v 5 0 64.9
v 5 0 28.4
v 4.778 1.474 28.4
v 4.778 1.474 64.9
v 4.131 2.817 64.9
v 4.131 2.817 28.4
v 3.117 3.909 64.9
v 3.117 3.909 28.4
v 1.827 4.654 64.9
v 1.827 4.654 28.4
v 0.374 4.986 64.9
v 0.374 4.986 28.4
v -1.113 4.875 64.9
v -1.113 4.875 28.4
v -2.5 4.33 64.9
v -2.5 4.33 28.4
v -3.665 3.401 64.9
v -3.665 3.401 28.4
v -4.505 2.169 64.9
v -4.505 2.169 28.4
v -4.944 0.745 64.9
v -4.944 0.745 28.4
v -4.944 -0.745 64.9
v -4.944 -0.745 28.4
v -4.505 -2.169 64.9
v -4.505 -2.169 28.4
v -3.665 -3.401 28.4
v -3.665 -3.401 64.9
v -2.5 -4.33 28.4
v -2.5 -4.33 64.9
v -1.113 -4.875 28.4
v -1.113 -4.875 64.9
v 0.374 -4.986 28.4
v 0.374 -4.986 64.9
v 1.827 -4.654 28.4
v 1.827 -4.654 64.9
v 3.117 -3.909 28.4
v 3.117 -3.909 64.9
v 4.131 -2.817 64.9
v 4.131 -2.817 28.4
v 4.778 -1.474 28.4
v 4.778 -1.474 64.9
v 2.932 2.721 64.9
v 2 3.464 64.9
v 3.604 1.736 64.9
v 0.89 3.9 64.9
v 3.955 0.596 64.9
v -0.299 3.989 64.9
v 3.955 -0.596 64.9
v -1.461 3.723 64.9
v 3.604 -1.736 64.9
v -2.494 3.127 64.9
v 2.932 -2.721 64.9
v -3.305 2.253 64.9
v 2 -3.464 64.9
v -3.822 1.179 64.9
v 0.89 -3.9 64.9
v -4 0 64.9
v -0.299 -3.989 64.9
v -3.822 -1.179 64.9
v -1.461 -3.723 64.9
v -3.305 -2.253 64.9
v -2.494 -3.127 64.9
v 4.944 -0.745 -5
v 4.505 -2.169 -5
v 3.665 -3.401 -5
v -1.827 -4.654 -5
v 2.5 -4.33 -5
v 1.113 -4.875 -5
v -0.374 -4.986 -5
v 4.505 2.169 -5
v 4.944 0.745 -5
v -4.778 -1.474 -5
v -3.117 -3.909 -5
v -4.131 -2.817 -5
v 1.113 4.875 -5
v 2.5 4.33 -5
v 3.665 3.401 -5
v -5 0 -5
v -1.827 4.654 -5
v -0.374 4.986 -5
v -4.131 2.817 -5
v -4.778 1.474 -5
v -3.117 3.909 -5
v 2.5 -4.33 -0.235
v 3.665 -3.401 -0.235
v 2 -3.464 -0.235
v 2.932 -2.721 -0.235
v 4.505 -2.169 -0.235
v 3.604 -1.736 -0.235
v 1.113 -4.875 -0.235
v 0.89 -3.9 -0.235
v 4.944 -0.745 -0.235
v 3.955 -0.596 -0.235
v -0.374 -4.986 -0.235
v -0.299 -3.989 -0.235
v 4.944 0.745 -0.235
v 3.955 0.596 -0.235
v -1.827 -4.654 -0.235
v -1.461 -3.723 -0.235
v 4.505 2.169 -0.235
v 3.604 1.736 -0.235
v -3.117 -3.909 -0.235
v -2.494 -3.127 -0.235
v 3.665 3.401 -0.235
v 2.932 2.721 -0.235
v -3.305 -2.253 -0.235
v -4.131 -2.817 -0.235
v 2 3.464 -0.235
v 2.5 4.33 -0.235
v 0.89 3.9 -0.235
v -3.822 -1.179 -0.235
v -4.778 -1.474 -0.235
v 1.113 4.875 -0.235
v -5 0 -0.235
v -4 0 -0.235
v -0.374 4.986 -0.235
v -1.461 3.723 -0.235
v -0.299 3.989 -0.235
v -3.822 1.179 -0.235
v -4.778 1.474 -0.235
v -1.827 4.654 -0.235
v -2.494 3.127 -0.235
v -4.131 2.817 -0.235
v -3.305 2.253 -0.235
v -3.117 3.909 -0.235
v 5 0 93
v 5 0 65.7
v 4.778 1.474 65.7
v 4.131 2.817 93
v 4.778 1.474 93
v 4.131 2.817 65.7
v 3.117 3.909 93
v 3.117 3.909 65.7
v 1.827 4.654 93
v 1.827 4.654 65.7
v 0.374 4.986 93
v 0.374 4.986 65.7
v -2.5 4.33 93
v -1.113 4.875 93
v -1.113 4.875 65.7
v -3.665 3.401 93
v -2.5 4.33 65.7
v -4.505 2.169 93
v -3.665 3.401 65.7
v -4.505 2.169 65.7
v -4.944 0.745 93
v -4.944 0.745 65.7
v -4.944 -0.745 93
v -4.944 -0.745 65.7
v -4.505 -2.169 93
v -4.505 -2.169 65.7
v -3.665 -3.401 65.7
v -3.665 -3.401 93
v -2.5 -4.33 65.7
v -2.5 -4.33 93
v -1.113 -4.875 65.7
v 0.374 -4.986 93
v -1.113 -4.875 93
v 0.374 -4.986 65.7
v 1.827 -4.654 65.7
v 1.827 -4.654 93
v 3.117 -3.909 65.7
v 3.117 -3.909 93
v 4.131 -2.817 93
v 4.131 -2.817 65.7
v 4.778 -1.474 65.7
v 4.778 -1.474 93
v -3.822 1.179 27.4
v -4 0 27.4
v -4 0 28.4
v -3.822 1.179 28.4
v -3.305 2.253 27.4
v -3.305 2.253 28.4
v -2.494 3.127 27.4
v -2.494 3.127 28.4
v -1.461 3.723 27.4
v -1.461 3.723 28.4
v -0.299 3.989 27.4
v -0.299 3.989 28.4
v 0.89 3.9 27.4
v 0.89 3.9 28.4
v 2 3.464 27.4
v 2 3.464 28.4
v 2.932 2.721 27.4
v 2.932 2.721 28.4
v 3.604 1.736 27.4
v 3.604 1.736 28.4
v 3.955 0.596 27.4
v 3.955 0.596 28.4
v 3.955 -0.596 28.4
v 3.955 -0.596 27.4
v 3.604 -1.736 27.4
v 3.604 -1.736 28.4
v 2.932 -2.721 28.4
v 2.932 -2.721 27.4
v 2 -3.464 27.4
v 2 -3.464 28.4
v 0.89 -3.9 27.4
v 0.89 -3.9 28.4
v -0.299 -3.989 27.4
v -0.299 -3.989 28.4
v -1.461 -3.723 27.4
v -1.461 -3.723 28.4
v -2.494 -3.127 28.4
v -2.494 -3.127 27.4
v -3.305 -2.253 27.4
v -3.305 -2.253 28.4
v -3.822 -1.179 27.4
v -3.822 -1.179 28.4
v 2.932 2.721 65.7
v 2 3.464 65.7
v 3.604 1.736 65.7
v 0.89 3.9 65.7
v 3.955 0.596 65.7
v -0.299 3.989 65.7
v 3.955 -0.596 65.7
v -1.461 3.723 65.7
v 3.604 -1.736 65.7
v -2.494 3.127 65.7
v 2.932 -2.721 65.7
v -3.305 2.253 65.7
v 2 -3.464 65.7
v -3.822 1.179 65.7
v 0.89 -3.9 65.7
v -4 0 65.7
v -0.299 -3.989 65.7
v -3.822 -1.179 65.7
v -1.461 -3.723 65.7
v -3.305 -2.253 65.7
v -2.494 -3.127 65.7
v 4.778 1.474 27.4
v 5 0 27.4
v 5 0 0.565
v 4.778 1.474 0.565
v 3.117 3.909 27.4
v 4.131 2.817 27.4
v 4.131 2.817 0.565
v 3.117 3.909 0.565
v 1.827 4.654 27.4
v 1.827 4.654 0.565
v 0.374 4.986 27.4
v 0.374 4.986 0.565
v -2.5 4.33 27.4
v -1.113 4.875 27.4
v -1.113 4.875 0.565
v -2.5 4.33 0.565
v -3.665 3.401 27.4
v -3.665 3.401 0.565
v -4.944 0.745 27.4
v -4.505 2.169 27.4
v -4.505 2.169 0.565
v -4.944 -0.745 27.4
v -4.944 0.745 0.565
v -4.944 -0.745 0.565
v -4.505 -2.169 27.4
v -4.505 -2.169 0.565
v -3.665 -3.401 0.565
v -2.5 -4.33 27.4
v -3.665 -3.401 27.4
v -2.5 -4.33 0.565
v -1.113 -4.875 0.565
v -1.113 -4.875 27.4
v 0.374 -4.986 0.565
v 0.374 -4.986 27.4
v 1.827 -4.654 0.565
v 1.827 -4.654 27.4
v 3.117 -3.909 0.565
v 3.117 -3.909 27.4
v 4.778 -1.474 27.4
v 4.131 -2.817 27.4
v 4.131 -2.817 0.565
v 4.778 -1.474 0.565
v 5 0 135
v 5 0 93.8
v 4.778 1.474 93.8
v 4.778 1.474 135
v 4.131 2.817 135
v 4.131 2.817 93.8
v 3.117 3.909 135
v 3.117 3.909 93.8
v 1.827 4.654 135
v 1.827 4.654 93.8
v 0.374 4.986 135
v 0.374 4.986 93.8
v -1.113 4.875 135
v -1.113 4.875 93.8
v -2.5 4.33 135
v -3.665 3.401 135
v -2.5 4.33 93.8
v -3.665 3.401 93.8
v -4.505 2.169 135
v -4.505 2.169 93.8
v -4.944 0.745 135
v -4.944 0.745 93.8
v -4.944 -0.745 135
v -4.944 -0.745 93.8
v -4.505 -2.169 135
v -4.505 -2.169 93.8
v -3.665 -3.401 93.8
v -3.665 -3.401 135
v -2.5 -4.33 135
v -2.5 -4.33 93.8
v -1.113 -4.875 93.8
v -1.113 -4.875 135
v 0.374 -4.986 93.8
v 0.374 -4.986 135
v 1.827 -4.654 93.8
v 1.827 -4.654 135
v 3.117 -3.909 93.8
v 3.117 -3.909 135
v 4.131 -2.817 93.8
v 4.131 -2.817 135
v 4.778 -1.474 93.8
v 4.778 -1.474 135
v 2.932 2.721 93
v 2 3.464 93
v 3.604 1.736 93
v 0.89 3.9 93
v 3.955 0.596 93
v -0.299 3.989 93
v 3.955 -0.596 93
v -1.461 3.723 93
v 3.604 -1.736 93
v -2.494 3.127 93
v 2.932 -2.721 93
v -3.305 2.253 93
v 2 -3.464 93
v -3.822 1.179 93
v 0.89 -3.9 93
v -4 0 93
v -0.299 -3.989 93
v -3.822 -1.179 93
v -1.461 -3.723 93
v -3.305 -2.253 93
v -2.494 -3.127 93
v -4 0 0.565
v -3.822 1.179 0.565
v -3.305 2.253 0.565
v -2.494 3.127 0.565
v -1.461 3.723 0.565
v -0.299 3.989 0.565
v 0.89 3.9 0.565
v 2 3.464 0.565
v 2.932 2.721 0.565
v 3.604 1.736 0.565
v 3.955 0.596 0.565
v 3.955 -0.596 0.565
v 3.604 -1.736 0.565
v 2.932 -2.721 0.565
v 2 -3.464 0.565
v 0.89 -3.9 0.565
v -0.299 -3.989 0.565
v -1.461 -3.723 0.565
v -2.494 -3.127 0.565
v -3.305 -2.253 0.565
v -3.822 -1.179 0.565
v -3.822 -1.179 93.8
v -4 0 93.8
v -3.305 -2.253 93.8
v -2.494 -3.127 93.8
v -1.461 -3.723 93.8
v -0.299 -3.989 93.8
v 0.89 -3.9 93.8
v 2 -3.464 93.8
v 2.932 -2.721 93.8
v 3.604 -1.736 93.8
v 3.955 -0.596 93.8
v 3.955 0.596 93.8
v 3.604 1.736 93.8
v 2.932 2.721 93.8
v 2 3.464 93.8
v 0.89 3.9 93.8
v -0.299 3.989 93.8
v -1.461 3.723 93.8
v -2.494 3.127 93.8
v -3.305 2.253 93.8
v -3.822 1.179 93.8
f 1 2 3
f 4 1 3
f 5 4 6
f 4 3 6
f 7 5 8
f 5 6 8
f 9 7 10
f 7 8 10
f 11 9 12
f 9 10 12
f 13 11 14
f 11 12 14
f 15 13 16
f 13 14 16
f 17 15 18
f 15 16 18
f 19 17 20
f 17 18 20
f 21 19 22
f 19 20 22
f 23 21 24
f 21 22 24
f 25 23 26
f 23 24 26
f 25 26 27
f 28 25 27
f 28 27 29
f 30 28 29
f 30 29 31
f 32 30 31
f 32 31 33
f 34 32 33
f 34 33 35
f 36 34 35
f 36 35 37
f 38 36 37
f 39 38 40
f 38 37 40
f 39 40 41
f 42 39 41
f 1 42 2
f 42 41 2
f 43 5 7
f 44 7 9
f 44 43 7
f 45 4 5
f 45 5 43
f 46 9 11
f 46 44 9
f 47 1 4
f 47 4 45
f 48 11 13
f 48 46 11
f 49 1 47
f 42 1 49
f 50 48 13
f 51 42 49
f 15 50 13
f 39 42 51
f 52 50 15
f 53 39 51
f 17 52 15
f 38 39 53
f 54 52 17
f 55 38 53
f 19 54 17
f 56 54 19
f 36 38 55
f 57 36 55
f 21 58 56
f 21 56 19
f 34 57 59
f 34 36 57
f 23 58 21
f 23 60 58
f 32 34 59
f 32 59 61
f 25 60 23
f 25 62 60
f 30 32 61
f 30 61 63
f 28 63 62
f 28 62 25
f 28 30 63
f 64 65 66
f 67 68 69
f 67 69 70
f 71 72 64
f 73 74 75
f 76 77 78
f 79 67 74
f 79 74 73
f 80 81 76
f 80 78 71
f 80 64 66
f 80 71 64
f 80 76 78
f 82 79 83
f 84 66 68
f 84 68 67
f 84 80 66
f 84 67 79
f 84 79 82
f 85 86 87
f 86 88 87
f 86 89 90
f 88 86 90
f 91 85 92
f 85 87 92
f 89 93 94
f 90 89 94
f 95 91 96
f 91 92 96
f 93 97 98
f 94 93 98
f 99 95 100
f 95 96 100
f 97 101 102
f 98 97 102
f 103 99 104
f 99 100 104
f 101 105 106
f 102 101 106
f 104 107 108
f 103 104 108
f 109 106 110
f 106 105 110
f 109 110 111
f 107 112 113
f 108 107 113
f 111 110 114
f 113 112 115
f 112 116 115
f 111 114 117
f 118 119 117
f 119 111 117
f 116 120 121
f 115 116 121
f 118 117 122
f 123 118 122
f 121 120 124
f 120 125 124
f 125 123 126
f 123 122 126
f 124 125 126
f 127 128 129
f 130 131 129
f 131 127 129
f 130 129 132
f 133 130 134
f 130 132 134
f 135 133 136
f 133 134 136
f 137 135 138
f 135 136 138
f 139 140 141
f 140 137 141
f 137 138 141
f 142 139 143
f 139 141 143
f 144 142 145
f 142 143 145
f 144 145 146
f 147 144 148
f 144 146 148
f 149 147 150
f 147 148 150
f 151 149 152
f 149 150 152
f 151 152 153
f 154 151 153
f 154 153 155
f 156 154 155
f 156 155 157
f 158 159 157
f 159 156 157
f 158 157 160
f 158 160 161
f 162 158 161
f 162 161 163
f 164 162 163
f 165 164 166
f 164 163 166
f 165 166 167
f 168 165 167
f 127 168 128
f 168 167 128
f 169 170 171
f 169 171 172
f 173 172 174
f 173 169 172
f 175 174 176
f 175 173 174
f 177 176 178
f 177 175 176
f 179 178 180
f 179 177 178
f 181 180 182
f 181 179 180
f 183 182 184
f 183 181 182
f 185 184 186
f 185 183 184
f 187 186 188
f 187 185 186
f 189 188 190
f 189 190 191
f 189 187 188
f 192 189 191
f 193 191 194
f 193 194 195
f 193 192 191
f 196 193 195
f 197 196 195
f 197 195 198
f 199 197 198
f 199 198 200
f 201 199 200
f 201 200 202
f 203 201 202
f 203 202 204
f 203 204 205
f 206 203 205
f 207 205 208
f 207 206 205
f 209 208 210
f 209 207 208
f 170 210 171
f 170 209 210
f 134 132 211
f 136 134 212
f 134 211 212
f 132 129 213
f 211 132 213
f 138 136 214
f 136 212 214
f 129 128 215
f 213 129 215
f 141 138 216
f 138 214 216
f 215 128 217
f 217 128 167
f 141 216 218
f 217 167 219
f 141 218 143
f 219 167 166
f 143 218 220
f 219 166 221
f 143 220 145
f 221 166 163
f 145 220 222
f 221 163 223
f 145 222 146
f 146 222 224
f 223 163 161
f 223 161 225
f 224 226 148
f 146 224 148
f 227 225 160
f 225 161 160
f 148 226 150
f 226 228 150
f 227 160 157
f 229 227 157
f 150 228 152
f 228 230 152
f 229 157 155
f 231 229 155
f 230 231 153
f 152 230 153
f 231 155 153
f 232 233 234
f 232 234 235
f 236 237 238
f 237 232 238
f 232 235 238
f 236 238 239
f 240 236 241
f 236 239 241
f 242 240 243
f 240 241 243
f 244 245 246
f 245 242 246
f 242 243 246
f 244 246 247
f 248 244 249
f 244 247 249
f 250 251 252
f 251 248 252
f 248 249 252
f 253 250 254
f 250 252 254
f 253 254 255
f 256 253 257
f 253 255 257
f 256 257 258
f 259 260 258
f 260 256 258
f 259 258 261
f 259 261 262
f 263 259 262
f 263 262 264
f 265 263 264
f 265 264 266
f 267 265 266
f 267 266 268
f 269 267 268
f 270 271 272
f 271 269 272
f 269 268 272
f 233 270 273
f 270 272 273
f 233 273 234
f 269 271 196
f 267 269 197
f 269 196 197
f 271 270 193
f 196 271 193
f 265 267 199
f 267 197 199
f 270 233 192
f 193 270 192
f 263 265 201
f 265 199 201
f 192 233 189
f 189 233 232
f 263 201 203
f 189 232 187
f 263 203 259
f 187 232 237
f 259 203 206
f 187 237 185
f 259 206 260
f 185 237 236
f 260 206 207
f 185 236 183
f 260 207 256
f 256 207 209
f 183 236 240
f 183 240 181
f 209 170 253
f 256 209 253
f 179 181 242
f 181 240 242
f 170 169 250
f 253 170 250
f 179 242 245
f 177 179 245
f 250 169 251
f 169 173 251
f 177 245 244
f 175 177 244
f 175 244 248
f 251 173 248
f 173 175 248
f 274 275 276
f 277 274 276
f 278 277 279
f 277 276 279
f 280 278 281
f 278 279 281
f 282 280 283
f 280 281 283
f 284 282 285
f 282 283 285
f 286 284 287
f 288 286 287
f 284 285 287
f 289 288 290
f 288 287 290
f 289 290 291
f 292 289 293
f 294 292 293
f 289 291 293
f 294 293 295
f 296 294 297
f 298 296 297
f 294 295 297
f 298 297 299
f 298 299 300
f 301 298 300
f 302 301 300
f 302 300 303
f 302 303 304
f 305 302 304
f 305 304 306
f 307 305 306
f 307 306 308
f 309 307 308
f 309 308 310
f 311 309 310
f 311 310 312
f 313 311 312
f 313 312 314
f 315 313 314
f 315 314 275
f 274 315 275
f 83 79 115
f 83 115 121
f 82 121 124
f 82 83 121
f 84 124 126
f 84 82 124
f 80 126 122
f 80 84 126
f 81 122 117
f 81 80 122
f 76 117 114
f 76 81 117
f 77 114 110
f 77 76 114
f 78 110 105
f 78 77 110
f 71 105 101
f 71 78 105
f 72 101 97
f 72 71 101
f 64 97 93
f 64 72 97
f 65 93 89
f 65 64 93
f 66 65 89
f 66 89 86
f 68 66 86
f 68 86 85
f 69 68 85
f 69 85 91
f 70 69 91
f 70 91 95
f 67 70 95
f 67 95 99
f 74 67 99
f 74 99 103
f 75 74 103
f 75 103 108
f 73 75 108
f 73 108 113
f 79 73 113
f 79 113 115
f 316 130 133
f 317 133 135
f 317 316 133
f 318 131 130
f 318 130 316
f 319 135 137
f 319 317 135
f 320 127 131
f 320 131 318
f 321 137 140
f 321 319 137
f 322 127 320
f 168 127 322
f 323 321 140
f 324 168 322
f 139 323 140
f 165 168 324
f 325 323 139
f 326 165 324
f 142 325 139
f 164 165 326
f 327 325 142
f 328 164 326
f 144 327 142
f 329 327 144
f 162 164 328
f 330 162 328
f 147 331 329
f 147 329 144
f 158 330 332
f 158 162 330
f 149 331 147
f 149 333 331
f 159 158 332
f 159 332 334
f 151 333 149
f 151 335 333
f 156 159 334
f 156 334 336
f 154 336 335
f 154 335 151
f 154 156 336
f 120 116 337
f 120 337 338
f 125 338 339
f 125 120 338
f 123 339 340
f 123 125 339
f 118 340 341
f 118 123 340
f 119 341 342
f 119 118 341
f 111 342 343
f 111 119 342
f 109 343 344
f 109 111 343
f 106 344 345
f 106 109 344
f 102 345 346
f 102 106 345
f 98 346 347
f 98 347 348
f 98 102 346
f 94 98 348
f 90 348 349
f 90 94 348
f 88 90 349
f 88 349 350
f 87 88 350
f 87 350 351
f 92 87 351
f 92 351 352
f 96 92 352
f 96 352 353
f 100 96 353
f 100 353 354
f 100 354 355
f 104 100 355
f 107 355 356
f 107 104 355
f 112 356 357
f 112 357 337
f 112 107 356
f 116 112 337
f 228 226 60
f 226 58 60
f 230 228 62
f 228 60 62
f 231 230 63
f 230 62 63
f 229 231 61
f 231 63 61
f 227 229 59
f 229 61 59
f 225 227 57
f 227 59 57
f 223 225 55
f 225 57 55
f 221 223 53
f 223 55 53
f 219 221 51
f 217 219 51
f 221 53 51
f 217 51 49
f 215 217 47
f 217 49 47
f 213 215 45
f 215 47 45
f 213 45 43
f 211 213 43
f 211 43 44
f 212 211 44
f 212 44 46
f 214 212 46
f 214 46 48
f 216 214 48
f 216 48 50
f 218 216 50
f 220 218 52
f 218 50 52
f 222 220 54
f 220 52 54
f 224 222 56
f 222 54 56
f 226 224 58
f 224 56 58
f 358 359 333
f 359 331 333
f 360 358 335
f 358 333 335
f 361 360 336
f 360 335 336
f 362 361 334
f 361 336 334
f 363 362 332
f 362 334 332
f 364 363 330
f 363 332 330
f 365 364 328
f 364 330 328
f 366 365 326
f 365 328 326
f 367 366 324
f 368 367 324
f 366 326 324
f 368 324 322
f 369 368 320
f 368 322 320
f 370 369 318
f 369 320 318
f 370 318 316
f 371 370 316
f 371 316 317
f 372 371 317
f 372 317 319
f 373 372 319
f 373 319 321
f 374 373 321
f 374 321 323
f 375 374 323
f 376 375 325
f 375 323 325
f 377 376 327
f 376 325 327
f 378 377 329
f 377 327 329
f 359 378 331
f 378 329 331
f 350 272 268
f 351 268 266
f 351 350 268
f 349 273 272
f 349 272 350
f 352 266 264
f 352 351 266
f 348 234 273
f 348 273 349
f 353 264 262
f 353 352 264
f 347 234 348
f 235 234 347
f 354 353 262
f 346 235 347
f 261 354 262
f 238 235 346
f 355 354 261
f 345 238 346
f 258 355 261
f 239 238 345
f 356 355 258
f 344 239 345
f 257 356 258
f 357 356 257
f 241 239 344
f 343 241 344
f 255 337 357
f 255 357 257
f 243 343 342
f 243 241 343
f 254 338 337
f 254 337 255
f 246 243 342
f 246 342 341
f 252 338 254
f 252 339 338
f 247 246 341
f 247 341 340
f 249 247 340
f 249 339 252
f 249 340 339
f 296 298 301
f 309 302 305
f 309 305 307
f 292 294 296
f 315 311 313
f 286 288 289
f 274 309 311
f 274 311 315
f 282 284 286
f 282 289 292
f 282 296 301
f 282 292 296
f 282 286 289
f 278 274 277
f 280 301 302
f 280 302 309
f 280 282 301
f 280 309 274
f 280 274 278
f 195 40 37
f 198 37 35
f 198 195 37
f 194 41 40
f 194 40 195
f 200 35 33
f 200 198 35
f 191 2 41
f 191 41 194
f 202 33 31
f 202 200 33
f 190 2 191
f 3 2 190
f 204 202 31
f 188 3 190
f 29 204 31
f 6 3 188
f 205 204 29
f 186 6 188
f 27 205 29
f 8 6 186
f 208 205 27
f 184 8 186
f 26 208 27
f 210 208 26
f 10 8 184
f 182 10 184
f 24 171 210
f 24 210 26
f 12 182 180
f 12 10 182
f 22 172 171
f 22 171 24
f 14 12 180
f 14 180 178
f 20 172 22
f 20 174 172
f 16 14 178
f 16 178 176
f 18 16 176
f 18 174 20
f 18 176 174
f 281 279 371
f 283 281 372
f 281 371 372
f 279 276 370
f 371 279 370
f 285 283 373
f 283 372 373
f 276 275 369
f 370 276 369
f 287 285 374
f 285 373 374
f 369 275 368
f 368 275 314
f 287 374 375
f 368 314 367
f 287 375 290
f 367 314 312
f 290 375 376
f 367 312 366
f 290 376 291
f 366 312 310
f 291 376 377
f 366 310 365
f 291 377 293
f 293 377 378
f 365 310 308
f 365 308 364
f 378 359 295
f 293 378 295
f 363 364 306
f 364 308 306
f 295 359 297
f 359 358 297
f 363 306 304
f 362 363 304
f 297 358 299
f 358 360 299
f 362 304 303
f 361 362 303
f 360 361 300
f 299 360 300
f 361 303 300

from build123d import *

# Parameters (mm, degrees)
SKETCH1_R           = 5
BOSS_EXTRUDE1_DEPTH = 135
SKETCH2_W           = 1
SKETCH2_H           = 0.8
BOSS_EXTRUDE2_START = 5
SKETCH3_R           = 5
BOSS_EXTRUDE2_DEPTH = 5
SKETCH4_R           = 5
SKETCH4_R_2         = 4
CUT_EXTRUDE1_DEPTH  = 0.8
SKETCH5_R           = 5
SKETCH5_R_2         = 4
CUT_EXTRUDE2_DEPTH  = 1


with BuildPart() as part:
    # Sketch1 → Boss-Extrude1 (new body)
    with BuildSketch(Plane.XY):
        Circle(SKETCH1_R)
    extrude(amount=BOSS_EXTRUDE1_DEPTH)

    # Sketch2 → Cut-Revolve1 (revolve, cut)
    with BuildSketch(Plane(origin=(0, 0, 0), x_dir=(1, 0, 0), z_dir=(0, 1, 0))):
        with Locations((-4.5, -65.3)):
            Rectangle(SKETCH2_W, SKETCH2_H)
        with Locations((-4.5, -93.4)):
            Rectangle(SKETCH2_W, SKETCH2_H)
    revolve(axis=Axis((0, 0, 6.050553304), (0, 0, 1)), mode=Mode.SUBTRACT)

    # Sketch3 → Boss-Extrude2 (add)
    with BuildSketch(Plane(origin=(0, 0, 0), x_dir=(-1, 0, 0), z_dir=(0, 0, -1)).offset(BOSS_EXTRUDE2_START)):
        Circle(SKETCH3_R)
    extrude(amount=-BOSS_EXTRUDE2_DEPTH)

    # Sketch4 → Cut-Extrude1 (cut)
    with BuildSketch(Plane(origin=(-672.545878218, -100.484437541, -0.235), x_dir=(-0.3247374432468007, 0.945804204343336, 0), z_dir=(0, 0, -1))):
        with Locations(Location((-123.362225461, 668.727778566, 0), (0, 0, 288.949668831))):
            Circle(SKETCH4_R)
        with Locations(Location((-123.362225461, 668.727778566, 0), (0, 0, 288.949668831))):
            Circle(SKETCH4_R_2, mode=Mode.SUBTRACT)
    extrude(amount=-CUT_EXTRUDE1_DEPTH, mode=Mode.SUBTRACT)

    # Sketch5 → Cut-Extrude2 (cut)
    with BuildSketch(Plane(origin=(-672.545878218, -100.484437541, 27.4), x_dir=(-0.3247374432468007, 0.945804204343336, 0), z_dir=(0, 0, -1))):
        with Locations(Location((-123.362225461, 668.727778566, 0), (0, 0, 288.949668831))):
            Circle(SKETCH5_R)
        with Locations(Location((-123.362225461, 668.727778566, 0), (0, 0, 288.949668831))):
            Circle(SKETCH5_R_2, mode=Mode.SUBTRACT)
    extrude(amount=-CUT_EXTRUDE2_DEPTH, mode=Mode.SUBTRACT)


solid = part.part
